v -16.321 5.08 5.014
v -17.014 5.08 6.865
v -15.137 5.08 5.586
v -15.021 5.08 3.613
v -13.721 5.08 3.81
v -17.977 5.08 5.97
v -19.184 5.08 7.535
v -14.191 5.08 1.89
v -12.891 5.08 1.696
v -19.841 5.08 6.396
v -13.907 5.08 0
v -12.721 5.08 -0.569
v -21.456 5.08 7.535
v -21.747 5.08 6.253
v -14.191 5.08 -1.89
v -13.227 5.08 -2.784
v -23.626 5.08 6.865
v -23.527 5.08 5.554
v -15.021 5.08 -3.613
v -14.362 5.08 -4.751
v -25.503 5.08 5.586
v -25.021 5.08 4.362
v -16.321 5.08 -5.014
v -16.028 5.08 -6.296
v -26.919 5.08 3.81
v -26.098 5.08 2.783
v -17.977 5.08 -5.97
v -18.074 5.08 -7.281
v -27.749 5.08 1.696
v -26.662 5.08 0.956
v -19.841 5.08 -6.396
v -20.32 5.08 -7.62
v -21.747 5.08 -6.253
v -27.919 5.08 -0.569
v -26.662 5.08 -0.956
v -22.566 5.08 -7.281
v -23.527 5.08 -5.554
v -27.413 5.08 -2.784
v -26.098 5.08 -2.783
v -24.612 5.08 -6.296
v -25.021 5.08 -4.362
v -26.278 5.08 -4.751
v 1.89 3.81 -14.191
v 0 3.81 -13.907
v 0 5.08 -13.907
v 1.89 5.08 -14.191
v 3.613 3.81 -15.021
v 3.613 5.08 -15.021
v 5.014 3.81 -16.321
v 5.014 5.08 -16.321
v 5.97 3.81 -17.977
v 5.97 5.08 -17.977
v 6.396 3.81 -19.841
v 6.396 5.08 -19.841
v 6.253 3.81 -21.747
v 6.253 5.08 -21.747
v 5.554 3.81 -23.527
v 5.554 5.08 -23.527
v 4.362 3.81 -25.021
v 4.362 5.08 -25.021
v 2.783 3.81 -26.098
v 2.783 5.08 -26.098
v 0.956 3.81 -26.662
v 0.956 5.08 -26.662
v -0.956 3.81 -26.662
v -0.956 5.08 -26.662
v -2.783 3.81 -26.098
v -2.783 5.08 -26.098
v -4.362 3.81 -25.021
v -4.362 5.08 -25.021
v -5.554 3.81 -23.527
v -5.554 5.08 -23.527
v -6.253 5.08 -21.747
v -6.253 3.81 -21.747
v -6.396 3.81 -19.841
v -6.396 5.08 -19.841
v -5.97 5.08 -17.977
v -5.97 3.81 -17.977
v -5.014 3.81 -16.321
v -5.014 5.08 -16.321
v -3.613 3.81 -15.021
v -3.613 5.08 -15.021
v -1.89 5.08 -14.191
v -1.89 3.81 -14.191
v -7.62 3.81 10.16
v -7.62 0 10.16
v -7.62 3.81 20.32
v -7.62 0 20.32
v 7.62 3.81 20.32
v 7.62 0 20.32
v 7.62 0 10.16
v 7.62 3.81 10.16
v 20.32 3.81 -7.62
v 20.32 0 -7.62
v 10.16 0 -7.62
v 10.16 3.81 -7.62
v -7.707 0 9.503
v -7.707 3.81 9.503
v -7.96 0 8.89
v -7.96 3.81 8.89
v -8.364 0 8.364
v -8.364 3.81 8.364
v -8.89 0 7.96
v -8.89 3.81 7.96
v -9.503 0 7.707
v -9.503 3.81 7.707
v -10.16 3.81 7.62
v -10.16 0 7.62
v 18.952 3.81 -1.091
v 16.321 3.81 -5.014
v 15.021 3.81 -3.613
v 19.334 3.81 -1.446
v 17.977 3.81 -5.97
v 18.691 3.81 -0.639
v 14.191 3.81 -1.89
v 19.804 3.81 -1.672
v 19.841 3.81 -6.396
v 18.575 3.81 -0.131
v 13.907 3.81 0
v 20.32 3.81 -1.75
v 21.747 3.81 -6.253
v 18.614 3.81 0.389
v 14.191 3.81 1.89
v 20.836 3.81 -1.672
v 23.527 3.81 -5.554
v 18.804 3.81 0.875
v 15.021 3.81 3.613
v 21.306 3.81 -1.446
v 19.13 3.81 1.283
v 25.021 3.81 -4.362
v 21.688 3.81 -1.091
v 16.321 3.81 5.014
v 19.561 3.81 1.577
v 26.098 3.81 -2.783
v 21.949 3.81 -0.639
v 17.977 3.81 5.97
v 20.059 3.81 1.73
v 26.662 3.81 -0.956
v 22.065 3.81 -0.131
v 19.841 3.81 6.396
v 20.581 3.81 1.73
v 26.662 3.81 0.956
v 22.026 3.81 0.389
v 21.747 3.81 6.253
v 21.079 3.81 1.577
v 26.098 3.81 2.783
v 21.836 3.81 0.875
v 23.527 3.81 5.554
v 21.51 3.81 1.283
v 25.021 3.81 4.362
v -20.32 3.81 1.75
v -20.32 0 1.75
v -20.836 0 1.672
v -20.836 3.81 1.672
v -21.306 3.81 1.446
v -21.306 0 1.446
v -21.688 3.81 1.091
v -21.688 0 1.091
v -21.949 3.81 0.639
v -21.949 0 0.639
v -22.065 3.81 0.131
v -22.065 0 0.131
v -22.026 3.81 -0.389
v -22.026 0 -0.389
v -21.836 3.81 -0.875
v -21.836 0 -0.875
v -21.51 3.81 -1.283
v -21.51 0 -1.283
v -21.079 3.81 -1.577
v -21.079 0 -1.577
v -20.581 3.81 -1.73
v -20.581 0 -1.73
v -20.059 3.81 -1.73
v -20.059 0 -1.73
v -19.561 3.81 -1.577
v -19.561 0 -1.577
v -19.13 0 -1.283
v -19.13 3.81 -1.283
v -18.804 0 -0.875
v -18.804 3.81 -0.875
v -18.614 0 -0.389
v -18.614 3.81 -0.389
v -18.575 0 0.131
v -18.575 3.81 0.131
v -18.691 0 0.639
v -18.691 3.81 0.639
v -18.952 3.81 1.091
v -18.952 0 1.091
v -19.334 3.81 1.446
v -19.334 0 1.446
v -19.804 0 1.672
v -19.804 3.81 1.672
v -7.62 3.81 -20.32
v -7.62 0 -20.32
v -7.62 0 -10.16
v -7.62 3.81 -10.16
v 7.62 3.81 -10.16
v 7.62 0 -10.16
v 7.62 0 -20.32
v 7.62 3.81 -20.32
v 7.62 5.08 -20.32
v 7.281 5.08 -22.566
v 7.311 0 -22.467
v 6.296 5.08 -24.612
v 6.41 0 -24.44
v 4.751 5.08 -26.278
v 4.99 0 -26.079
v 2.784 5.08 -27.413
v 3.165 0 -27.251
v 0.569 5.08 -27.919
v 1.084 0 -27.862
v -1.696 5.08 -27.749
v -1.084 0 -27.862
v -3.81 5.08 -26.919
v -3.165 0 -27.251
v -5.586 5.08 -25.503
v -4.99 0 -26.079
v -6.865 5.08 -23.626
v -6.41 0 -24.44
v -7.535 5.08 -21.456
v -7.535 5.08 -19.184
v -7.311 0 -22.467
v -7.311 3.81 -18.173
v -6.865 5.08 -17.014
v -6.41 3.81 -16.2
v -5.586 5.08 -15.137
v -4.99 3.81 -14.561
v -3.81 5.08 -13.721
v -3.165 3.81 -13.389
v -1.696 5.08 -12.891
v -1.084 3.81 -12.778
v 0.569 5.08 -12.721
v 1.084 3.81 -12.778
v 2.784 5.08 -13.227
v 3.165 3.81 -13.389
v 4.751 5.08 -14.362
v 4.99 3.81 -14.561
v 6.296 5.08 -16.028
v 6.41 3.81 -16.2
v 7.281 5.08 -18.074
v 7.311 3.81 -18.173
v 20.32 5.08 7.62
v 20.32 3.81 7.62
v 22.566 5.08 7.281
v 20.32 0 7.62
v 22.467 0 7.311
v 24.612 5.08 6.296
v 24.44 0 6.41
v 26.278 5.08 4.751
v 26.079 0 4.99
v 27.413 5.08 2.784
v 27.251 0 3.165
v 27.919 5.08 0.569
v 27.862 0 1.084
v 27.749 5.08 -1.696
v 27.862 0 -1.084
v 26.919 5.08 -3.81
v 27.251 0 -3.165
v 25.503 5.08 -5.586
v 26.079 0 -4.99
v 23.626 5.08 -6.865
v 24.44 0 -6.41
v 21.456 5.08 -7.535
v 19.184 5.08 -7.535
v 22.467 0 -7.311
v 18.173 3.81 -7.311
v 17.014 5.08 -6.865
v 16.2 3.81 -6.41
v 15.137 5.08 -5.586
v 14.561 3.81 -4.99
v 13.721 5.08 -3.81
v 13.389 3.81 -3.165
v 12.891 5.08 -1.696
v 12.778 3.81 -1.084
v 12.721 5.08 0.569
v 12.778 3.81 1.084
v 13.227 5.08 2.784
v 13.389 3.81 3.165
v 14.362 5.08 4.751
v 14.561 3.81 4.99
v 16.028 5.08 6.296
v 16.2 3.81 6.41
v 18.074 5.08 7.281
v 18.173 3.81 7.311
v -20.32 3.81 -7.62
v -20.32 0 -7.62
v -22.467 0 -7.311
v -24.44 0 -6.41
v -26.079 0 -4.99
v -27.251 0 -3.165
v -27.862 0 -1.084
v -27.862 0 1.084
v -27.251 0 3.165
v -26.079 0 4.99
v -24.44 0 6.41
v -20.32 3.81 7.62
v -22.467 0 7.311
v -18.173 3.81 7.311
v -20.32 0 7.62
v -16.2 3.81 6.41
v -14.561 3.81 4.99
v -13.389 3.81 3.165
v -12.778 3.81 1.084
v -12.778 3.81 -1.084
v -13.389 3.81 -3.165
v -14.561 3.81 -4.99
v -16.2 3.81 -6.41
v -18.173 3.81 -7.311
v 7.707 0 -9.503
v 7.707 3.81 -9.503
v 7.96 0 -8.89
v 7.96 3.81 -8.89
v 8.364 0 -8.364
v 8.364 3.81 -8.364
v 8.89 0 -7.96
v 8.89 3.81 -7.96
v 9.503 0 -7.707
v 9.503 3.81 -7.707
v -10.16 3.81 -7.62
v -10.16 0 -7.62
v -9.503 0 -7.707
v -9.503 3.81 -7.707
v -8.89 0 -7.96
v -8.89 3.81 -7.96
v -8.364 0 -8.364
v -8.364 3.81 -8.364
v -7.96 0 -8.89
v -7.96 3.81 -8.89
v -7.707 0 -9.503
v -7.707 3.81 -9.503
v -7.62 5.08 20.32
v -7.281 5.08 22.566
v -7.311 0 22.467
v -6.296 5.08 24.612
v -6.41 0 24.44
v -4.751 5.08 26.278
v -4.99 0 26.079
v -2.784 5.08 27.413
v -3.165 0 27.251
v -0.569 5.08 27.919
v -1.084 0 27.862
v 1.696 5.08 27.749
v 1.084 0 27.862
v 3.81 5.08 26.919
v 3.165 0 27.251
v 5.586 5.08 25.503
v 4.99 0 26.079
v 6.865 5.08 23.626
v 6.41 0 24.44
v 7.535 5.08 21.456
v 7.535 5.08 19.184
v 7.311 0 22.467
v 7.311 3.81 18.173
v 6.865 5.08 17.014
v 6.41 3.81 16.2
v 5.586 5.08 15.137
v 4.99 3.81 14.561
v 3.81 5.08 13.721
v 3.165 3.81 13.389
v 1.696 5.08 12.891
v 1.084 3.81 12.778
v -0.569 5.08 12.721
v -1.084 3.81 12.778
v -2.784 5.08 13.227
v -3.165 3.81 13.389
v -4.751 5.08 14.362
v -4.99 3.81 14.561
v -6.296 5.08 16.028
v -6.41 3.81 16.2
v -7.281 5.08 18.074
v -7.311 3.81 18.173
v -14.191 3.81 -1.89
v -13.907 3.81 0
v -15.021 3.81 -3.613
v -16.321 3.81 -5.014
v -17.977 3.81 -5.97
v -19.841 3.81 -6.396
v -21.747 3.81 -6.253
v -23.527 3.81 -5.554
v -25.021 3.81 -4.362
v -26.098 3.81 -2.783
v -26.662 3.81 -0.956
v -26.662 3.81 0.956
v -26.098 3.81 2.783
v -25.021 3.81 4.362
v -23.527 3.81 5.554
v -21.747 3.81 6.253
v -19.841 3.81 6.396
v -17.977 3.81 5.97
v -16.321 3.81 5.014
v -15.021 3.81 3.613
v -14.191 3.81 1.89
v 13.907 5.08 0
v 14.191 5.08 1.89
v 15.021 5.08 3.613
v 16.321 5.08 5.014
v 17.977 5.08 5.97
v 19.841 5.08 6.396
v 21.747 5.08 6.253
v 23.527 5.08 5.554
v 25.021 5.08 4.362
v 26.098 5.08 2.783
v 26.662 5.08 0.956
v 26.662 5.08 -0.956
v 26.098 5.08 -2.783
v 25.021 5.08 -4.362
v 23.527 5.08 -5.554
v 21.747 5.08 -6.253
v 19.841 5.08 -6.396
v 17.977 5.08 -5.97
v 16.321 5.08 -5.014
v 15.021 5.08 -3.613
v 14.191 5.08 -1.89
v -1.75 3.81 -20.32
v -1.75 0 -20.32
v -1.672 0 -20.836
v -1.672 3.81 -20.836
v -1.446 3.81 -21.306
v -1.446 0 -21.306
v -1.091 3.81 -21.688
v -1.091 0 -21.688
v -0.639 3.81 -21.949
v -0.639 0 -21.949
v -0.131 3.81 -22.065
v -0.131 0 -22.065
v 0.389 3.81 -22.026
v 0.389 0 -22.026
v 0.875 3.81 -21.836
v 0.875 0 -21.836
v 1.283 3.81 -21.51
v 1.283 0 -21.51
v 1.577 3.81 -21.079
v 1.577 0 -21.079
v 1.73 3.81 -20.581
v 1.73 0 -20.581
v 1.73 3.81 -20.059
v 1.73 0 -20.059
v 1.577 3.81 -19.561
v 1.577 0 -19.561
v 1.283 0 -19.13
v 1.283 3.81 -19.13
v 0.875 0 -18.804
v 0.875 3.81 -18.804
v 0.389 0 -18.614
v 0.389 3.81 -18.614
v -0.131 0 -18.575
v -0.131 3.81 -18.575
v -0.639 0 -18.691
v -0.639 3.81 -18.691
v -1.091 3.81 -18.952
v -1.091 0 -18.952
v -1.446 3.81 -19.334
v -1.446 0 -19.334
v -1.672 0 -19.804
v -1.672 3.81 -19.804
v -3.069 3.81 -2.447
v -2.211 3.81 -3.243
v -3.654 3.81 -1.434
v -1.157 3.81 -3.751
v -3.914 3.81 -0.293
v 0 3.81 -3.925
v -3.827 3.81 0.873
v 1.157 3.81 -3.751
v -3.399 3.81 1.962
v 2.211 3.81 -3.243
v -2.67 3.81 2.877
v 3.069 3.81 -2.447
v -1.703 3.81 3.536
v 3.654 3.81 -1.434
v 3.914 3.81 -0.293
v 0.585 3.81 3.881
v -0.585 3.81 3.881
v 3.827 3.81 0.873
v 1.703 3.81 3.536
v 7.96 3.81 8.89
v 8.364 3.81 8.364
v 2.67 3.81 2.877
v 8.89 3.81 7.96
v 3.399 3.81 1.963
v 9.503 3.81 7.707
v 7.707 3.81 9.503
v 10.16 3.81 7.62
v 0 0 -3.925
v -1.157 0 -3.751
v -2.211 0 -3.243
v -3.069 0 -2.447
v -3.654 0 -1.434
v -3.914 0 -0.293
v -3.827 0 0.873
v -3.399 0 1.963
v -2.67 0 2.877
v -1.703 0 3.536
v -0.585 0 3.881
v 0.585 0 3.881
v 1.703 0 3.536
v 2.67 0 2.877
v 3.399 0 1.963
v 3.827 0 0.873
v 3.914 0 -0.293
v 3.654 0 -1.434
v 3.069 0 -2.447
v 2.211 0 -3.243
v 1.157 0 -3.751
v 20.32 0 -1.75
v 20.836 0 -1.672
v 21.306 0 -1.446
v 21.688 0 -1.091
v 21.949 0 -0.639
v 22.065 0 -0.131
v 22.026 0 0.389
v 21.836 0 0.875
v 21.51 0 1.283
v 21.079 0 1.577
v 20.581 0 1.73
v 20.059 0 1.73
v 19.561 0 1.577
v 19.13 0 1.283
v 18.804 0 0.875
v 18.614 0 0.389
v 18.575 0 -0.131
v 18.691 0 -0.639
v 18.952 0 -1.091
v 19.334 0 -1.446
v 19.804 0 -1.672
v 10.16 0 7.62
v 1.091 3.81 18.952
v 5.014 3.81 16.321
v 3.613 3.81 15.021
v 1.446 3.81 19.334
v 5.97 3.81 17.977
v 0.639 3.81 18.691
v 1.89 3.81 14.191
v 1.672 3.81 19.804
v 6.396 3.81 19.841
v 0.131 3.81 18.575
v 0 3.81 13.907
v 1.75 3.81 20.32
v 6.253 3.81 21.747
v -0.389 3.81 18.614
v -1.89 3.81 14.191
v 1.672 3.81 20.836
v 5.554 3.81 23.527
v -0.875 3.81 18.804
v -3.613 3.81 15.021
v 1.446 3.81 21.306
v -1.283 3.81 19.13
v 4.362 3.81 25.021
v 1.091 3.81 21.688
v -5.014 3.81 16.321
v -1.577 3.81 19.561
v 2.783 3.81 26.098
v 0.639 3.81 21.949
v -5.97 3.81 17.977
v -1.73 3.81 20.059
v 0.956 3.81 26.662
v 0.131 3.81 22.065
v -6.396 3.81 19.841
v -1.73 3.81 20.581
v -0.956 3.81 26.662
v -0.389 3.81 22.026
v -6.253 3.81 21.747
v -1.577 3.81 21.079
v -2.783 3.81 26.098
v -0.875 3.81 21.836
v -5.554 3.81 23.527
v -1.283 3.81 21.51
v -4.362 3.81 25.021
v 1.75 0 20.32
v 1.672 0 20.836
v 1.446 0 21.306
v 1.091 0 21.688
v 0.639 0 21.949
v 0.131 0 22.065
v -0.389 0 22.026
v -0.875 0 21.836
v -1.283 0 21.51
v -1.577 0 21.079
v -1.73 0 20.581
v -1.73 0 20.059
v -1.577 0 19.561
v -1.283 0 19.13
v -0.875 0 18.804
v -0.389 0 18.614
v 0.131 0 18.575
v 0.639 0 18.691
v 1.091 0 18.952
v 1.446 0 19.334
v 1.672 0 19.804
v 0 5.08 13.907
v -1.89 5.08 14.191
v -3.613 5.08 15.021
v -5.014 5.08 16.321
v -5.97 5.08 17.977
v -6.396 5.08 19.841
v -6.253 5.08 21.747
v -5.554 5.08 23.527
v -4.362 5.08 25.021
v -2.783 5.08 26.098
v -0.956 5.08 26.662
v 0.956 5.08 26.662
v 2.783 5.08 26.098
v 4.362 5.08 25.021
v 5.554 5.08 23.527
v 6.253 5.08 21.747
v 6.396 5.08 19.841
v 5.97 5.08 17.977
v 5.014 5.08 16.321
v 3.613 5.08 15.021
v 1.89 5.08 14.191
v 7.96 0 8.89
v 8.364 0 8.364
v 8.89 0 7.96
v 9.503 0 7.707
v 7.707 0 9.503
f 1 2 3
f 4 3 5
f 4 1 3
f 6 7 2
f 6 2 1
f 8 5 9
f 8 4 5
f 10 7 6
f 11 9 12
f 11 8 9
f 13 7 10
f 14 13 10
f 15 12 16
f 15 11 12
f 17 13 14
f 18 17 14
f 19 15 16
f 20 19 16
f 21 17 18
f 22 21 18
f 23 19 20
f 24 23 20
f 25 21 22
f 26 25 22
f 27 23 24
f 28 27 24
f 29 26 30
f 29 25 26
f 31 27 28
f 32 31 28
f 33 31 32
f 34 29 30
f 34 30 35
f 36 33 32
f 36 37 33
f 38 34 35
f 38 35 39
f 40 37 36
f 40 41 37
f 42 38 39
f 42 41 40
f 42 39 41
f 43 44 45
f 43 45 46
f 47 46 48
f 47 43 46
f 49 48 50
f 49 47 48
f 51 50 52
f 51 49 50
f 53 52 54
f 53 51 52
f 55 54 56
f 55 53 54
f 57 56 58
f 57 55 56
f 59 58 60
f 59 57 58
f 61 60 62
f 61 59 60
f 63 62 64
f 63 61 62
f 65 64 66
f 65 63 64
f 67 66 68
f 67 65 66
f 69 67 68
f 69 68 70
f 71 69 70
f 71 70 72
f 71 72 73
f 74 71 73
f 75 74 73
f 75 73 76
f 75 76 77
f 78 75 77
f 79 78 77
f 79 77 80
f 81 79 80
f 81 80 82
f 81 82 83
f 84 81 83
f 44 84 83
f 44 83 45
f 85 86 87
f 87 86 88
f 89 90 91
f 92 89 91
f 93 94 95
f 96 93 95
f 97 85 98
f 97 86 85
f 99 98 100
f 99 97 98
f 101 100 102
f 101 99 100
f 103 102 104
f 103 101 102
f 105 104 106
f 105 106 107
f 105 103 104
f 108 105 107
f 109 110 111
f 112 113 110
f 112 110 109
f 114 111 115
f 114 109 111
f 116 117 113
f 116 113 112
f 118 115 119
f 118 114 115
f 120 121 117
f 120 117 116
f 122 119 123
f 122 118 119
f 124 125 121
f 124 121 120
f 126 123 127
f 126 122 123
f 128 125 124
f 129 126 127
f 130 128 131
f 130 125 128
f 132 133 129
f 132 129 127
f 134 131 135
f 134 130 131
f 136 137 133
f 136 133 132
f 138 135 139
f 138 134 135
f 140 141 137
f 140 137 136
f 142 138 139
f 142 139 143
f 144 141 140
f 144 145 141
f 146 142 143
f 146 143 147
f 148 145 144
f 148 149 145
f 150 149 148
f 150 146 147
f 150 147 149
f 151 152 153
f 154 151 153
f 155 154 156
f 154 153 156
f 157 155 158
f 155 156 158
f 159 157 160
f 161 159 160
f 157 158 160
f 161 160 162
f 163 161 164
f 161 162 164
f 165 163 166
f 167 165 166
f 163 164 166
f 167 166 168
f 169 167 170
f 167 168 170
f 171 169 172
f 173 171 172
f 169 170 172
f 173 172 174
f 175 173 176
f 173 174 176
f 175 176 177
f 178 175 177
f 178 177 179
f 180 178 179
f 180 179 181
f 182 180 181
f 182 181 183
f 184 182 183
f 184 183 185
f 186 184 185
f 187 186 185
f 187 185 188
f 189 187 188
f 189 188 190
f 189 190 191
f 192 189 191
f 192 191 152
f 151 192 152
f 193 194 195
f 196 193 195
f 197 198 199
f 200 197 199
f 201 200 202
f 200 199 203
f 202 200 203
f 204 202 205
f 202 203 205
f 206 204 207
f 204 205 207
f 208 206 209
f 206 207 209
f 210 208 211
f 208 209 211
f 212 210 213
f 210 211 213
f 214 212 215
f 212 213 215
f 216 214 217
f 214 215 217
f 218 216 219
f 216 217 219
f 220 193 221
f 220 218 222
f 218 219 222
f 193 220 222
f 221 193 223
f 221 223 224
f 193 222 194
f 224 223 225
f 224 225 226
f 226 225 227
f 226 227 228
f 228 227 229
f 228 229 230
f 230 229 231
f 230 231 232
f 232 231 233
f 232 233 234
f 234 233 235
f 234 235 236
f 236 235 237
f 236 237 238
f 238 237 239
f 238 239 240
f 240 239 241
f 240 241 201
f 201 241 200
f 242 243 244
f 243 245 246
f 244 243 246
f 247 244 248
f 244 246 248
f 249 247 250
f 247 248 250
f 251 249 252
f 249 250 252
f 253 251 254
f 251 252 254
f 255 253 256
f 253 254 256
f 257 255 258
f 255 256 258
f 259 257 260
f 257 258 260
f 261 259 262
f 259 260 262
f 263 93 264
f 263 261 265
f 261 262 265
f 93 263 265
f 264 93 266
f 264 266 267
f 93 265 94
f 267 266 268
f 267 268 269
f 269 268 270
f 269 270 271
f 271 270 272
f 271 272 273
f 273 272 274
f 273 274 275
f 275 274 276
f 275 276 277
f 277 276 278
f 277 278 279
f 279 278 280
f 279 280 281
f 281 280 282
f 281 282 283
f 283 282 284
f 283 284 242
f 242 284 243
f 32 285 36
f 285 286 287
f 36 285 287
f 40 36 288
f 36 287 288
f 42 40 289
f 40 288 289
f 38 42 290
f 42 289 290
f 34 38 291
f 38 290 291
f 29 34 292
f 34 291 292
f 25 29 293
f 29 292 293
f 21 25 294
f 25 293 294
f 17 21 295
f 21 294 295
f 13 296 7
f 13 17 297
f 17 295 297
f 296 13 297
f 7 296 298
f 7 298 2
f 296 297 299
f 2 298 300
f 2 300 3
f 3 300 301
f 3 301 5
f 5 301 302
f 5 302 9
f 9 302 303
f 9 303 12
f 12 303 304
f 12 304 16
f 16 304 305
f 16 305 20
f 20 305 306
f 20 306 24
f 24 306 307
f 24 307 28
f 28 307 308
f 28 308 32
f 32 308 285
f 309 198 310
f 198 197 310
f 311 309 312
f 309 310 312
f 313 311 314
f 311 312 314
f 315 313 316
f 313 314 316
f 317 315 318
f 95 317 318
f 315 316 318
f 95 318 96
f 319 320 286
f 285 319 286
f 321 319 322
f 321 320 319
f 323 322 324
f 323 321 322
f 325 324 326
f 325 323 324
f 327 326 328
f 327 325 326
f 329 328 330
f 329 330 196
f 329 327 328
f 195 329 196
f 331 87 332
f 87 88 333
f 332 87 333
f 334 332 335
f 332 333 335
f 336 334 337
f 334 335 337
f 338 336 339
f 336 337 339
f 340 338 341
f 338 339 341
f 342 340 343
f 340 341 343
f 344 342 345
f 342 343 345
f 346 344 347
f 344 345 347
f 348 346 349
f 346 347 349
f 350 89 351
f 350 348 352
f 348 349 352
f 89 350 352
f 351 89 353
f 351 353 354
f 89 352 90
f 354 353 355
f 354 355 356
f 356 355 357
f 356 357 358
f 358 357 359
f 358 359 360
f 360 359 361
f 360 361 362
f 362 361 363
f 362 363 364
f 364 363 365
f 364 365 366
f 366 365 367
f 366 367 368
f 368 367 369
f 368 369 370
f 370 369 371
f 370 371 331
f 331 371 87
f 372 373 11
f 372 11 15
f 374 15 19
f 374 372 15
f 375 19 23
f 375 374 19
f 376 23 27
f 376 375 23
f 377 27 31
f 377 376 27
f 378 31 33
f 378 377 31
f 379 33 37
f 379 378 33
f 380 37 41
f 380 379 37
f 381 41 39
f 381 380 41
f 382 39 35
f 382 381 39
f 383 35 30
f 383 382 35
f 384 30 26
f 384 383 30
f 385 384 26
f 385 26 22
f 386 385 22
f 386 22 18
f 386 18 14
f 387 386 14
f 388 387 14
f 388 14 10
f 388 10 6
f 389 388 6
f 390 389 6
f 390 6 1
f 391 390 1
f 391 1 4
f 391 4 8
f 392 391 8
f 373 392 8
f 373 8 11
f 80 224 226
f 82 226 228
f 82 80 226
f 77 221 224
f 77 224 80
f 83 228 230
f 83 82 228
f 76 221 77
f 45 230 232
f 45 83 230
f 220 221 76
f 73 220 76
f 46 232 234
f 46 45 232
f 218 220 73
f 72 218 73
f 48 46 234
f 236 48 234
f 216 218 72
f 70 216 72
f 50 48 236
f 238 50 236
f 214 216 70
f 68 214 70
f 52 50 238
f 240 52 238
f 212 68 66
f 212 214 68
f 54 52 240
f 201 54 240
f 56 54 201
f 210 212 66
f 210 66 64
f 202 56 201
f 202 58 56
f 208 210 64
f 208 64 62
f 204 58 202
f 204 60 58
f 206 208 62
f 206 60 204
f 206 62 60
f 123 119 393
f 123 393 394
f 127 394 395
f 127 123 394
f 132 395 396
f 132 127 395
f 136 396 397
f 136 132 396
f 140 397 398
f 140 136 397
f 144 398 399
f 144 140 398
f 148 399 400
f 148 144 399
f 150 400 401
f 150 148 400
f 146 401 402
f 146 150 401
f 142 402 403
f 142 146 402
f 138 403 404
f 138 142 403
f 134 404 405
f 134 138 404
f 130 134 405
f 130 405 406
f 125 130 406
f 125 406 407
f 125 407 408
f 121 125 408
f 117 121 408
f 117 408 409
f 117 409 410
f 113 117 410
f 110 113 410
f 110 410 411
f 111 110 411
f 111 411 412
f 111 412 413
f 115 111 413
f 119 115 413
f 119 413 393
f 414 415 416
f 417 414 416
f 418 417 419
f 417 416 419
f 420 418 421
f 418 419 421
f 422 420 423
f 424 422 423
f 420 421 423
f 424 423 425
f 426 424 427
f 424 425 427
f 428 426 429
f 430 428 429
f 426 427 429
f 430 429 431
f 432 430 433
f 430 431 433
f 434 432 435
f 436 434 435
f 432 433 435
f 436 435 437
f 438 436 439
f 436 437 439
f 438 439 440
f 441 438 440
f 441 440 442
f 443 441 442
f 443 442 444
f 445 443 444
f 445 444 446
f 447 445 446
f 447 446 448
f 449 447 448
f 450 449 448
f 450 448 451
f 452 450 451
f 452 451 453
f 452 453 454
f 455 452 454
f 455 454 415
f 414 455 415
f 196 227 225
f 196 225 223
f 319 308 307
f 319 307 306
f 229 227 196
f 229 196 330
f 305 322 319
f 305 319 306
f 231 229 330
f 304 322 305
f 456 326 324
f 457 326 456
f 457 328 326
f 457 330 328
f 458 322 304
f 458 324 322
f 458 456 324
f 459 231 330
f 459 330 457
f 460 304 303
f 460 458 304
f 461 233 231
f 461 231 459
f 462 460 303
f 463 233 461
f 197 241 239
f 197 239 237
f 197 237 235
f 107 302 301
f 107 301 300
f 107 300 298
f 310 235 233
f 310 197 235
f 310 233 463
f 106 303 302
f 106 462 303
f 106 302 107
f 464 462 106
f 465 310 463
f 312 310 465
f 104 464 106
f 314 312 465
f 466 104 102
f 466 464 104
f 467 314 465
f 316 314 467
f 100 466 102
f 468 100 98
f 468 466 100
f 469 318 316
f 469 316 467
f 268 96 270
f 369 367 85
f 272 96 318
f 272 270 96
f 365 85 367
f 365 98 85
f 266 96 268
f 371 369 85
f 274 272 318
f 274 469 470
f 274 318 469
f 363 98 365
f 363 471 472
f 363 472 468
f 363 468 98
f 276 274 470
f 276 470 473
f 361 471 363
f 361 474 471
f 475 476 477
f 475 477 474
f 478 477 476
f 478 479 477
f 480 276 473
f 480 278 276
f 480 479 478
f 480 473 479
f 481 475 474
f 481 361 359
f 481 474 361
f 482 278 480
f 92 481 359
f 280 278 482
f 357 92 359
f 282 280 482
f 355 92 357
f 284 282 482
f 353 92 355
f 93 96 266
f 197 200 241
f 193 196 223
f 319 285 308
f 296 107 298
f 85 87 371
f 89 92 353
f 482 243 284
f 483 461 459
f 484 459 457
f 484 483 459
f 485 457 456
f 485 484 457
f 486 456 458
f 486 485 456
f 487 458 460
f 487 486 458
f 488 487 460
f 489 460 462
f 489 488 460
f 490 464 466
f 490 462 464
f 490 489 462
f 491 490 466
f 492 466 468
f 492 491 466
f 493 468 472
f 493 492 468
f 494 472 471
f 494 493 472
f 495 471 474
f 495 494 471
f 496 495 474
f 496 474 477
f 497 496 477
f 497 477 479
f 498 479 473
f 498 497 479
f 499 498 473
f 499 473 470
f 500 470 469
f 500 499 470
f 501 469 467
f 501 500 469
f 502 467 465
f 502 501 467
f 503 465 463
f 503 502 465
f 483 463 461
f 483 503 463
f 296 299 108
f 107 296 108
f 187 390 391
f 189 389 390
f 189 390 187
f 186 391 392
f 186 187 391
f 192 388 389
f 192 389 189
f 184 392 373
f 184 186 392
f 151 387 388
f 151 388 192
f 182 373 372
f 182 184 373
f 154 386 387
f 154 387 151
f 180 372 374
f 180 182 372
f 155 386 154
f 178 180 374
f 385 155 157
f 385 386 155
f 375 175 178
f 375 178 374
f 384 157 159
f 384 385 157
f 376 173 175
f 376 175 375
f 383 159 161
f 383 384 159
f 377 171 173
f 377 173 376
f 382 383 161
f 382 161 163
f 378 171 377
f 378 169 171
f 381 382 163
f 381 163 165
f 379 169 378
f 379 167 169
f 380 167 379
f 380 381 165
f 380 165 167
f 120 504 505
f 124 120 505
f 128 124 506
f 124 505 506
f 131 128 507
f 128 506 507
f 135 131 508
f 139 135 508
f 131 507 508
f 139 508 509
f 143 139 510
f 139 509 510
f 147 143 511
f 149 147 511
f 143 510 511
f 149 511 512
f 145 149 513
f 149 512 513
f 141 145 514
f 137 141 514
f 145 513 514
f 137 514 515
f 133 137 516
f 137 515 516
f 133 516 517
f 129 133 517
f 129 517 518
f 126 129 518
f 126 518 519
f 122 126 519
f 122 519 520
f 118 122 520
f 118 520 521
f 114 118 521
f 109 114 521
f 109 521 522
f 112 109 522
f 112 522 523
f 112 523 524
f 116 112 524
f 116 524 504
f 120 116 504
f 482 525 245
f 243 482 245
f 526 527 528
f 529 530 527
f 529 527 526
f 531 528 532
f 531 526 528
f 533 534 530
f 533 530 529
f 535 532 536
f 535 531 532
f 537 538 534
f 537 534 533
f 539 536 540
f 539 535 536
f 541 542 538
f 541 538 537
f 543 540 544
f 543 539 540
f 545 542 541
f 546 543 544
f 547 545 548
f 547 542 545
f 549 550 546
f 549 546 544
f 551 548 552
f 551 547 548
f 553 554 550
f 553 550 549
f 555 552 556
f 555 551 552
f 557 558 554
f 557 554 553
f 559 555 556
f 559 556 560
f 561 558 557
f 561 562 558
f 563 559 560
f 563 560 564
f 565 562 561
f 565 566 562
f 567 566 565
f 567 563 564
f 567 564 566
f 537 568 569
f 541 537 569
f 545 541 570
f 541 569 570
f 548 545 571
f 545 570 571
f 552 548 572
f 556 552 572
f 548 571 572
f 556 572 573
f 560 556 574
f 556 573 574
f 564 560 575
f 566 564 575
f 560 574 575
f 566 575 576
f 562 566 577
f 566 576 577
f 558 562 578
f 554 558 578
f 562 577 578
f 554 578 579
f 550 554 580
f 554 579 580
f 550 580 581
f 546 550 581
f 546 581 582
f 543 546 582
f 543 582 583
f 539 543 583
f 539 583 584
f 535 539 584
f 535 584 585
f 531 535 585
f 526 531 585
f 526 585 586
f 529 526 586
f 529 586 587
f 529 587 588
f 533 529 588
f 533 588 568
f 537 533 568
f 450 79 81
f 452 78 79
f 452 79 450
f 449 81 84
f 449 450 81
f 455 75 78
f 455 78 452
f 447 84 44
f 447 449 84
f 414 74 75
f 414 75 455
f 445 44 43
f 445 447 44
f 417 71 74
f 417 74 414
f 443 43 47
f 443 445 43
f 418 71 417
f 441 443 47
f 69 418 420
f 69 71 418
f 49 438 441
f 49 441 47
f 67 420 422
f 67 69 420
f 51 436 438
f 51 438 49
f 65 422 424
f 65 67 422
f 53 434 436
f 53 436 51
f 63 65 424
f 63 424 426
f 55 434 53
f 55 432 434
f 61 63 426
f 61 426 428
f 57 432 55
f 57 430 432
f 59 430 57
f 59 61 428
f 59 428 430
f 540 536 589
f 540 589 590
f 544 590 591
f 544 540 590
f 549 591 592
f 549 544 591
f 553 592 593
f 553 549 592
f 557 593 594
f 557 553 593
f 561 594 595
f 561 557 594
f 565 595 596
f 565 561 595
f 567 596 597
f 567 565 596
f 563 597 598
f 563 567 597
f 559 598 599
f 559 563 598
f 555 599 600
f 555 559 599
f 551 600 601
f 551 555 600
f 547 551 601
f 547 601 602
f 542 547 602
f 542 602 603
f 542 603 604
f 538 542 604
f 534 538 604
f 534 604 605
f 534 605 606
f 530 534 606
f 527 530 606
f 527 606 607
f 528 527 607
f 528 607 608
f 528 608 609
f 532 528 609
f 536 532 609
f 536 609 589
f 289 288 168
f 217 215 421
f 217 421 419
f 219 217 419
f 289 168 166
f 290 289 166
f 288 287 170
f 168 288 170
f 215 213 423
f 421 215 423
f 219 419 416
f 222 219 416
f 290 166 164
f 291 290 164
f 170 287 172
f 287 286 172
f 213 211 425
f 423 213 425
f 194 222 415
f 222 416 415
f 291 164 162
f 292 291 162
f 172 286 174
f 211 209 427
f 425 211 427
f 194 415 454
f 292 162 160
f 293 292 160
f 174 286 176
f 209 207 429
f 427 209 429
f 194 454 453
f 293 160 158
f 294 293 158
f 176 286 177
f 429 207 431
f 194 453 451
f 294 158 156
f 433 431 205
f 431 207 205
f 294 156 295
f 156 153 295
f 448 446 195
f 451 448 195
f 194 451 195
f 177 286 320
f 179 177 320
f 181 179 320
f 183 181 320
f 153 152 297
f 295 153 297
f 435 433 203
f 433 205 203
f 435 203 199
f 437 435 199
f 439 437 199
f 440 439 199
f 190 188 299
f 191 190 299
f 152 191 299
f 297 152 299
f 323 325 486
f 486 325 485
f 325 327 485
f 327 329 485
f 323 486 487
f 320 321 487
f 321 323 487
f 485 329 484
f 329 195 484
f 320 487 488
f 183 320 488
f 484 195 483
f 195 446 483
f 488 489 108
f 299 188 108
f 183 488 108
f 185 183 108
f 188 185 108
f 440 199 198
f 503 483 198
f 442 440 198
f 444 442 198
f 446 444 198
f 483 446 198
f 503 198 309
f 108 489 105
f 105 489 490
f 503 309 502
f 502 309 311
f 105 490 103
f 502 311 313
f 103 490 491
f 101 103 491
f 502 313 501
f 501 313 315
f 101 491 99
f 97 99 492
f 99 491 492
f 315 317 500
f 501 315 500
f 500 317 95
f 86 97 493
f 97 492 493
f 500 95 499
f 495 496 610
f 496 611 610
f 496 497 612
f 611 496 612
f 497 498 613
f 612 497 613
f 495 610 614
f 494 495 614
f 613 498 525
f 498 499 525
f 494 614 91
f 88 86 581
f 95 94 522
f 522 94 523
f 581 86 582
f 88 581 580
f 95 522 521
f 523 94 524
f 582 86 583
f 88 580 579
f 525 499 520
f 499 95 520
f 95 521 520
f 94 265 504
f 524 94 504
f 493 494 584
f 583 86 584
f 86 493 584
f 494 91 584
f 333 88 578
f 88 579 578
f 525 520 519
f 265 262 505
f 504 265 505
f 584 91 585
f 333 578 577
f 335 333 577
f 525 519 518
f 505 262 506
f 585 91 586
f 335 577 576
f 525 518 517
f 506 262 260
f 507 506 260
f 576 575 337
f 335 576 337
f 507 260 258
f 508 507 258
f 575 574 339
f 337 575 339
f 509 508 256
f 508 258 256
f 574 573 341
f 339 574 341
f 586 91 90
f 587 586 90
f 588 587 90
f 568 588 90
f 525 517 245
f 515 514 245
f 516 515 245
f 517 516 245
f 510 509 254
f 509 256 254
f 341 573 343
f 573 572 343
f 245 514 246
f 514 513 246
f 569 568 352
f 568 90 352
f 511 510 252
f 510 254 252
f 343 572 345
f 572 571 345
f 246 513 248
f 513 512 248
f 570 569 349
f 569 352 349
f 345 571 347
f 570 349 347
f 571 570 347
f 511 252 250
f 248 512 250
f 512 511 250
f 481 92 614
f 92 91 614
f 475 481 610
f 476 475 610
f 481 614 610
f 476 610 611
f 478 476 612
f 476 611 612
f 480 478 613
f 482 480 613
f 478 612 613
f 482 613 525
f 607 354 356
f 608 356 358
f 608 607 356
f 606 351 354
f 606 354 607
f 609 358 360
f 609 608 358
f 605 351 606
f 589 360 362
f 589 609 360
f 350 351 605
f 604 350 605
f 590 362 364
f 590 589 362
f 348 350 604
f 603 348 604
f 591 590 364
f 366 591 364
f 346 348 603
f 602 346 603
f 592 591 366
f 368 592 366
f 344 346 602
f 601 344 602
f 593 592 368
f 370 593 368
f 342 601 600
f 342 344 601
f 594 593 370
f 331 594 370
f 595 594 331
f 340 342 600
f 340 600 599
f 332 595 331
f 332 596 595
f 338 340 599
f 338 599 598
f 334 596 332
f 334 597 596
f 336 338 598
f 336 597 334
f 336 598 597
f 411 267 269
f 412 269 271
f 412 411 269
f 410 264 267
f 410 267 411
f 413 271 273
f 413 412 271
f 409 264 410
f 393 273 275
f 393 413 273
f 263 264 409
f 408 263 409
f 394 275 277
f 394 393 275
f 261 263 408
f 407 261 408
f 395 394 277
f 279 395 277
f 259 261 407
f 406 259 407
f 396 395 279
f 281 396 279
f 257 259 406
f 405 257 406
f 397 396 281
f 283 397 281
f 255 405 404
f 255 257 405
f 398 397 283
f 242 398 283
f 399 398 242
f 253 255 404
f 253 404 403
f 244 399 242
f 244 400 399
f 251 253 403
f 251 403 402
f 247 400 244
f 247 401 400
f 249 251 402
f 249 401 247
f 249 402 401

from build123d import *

# Parameters (mm, degrees)
SKETCH1_R                       = 3.925
BOSS_EXTRUDE1_DEPTH             = 3.81
SKETCH1_3_R                     = 6.4135
BOSS_EXTRUDE2_DEPTH             = 5.08
F_5_0_13779528_DIAMETER_HOLE1_D = 3.500000112
CIRPATTERN1_COUNT               = 4
FILLET1_R                       = 2.54


with BuildPart() as part:
    # Sketch1 → Boss-Extrude1 (new body)
    with BuildSketch(Plane(origin=(0, 0, 0), x_dir=(1, 0, 0), z_dir=(0, 1, 0))):
        with BuildLine():
            ThreePointArc((7.62, 20.32), (0, 27.94), (-7.62, 20.32))
            Line((-7.62, 20.32), (-7.62, 6.892838675))
            ThreePointArc((-7.62, 6.892838675), (0, -10.275), (7.62, 6.892838675))
            Line((7.62, 6.892838675), (7.62, 20.32))
        make_face()
        Circle(SKETCH1_R, mode=Mode.SUBTRACT)
    extrude(amount=BOSS_EXTRUDE1_DEPTH)

    # Sketch1<3> → Boss-Extrude2 (add)
    with BuildSketch(Plane(origin=(0, 0, 0), x_dir=(1, 0, 0), z_dir=(0, 1, 0))):
        with BuildLine():
            ThreePointArc((-7.62, 20.32), (0, 12.7), (7.62, 20.32))
            ThreePointArc((7.62, 20.32), (0, 27.94), (-7.62, 20.32))
        make_face()
        with Locations((0, 20.32)):
            Circle(SKETCH1_3_R, mode=Mode.SUBTRACT)
    extrude(amount=BOSS_EXTRUDE2_DEPTH)

    # #5 (0.13779528) Diameter Hole1 (through all)
    with Locations(Plane(origin=(0, 3.81, 0), x_dir=(1, 0, 0), z_dir=(0, 1, 0))):
        with Locations((0, 20.32)):
            Hole(F_5_0_13779528_DIAMETER_HOLE1_D / 2)

    # CirPattern1: part ×4 about axis
    cirpattern1_axis = Axis((0, 3.81, 0), (0, 1, 0))


with BuildPart() as part_1:
    add(part.part)
    for i in range(1, CIRPATTERN1_COUNT):
        add(part.part.rotate(cirpattern1_axis, i * 360 / CIRPATTERN1_COUNT))

    # Fillet1
    fillet1_edges = [part_1.edges().sort_by_distance(p)[0] for p in [
        (-7.62, 1.905, -7.62),
        (7.62, 1.905, -7.62),
        (-7.62, 1.905, 7.62),
        (7.62, 1.905, 7.62),
    ]]
    fillet(fillet1_edges, radius=FILLET1_R)


solid = part_1.part
